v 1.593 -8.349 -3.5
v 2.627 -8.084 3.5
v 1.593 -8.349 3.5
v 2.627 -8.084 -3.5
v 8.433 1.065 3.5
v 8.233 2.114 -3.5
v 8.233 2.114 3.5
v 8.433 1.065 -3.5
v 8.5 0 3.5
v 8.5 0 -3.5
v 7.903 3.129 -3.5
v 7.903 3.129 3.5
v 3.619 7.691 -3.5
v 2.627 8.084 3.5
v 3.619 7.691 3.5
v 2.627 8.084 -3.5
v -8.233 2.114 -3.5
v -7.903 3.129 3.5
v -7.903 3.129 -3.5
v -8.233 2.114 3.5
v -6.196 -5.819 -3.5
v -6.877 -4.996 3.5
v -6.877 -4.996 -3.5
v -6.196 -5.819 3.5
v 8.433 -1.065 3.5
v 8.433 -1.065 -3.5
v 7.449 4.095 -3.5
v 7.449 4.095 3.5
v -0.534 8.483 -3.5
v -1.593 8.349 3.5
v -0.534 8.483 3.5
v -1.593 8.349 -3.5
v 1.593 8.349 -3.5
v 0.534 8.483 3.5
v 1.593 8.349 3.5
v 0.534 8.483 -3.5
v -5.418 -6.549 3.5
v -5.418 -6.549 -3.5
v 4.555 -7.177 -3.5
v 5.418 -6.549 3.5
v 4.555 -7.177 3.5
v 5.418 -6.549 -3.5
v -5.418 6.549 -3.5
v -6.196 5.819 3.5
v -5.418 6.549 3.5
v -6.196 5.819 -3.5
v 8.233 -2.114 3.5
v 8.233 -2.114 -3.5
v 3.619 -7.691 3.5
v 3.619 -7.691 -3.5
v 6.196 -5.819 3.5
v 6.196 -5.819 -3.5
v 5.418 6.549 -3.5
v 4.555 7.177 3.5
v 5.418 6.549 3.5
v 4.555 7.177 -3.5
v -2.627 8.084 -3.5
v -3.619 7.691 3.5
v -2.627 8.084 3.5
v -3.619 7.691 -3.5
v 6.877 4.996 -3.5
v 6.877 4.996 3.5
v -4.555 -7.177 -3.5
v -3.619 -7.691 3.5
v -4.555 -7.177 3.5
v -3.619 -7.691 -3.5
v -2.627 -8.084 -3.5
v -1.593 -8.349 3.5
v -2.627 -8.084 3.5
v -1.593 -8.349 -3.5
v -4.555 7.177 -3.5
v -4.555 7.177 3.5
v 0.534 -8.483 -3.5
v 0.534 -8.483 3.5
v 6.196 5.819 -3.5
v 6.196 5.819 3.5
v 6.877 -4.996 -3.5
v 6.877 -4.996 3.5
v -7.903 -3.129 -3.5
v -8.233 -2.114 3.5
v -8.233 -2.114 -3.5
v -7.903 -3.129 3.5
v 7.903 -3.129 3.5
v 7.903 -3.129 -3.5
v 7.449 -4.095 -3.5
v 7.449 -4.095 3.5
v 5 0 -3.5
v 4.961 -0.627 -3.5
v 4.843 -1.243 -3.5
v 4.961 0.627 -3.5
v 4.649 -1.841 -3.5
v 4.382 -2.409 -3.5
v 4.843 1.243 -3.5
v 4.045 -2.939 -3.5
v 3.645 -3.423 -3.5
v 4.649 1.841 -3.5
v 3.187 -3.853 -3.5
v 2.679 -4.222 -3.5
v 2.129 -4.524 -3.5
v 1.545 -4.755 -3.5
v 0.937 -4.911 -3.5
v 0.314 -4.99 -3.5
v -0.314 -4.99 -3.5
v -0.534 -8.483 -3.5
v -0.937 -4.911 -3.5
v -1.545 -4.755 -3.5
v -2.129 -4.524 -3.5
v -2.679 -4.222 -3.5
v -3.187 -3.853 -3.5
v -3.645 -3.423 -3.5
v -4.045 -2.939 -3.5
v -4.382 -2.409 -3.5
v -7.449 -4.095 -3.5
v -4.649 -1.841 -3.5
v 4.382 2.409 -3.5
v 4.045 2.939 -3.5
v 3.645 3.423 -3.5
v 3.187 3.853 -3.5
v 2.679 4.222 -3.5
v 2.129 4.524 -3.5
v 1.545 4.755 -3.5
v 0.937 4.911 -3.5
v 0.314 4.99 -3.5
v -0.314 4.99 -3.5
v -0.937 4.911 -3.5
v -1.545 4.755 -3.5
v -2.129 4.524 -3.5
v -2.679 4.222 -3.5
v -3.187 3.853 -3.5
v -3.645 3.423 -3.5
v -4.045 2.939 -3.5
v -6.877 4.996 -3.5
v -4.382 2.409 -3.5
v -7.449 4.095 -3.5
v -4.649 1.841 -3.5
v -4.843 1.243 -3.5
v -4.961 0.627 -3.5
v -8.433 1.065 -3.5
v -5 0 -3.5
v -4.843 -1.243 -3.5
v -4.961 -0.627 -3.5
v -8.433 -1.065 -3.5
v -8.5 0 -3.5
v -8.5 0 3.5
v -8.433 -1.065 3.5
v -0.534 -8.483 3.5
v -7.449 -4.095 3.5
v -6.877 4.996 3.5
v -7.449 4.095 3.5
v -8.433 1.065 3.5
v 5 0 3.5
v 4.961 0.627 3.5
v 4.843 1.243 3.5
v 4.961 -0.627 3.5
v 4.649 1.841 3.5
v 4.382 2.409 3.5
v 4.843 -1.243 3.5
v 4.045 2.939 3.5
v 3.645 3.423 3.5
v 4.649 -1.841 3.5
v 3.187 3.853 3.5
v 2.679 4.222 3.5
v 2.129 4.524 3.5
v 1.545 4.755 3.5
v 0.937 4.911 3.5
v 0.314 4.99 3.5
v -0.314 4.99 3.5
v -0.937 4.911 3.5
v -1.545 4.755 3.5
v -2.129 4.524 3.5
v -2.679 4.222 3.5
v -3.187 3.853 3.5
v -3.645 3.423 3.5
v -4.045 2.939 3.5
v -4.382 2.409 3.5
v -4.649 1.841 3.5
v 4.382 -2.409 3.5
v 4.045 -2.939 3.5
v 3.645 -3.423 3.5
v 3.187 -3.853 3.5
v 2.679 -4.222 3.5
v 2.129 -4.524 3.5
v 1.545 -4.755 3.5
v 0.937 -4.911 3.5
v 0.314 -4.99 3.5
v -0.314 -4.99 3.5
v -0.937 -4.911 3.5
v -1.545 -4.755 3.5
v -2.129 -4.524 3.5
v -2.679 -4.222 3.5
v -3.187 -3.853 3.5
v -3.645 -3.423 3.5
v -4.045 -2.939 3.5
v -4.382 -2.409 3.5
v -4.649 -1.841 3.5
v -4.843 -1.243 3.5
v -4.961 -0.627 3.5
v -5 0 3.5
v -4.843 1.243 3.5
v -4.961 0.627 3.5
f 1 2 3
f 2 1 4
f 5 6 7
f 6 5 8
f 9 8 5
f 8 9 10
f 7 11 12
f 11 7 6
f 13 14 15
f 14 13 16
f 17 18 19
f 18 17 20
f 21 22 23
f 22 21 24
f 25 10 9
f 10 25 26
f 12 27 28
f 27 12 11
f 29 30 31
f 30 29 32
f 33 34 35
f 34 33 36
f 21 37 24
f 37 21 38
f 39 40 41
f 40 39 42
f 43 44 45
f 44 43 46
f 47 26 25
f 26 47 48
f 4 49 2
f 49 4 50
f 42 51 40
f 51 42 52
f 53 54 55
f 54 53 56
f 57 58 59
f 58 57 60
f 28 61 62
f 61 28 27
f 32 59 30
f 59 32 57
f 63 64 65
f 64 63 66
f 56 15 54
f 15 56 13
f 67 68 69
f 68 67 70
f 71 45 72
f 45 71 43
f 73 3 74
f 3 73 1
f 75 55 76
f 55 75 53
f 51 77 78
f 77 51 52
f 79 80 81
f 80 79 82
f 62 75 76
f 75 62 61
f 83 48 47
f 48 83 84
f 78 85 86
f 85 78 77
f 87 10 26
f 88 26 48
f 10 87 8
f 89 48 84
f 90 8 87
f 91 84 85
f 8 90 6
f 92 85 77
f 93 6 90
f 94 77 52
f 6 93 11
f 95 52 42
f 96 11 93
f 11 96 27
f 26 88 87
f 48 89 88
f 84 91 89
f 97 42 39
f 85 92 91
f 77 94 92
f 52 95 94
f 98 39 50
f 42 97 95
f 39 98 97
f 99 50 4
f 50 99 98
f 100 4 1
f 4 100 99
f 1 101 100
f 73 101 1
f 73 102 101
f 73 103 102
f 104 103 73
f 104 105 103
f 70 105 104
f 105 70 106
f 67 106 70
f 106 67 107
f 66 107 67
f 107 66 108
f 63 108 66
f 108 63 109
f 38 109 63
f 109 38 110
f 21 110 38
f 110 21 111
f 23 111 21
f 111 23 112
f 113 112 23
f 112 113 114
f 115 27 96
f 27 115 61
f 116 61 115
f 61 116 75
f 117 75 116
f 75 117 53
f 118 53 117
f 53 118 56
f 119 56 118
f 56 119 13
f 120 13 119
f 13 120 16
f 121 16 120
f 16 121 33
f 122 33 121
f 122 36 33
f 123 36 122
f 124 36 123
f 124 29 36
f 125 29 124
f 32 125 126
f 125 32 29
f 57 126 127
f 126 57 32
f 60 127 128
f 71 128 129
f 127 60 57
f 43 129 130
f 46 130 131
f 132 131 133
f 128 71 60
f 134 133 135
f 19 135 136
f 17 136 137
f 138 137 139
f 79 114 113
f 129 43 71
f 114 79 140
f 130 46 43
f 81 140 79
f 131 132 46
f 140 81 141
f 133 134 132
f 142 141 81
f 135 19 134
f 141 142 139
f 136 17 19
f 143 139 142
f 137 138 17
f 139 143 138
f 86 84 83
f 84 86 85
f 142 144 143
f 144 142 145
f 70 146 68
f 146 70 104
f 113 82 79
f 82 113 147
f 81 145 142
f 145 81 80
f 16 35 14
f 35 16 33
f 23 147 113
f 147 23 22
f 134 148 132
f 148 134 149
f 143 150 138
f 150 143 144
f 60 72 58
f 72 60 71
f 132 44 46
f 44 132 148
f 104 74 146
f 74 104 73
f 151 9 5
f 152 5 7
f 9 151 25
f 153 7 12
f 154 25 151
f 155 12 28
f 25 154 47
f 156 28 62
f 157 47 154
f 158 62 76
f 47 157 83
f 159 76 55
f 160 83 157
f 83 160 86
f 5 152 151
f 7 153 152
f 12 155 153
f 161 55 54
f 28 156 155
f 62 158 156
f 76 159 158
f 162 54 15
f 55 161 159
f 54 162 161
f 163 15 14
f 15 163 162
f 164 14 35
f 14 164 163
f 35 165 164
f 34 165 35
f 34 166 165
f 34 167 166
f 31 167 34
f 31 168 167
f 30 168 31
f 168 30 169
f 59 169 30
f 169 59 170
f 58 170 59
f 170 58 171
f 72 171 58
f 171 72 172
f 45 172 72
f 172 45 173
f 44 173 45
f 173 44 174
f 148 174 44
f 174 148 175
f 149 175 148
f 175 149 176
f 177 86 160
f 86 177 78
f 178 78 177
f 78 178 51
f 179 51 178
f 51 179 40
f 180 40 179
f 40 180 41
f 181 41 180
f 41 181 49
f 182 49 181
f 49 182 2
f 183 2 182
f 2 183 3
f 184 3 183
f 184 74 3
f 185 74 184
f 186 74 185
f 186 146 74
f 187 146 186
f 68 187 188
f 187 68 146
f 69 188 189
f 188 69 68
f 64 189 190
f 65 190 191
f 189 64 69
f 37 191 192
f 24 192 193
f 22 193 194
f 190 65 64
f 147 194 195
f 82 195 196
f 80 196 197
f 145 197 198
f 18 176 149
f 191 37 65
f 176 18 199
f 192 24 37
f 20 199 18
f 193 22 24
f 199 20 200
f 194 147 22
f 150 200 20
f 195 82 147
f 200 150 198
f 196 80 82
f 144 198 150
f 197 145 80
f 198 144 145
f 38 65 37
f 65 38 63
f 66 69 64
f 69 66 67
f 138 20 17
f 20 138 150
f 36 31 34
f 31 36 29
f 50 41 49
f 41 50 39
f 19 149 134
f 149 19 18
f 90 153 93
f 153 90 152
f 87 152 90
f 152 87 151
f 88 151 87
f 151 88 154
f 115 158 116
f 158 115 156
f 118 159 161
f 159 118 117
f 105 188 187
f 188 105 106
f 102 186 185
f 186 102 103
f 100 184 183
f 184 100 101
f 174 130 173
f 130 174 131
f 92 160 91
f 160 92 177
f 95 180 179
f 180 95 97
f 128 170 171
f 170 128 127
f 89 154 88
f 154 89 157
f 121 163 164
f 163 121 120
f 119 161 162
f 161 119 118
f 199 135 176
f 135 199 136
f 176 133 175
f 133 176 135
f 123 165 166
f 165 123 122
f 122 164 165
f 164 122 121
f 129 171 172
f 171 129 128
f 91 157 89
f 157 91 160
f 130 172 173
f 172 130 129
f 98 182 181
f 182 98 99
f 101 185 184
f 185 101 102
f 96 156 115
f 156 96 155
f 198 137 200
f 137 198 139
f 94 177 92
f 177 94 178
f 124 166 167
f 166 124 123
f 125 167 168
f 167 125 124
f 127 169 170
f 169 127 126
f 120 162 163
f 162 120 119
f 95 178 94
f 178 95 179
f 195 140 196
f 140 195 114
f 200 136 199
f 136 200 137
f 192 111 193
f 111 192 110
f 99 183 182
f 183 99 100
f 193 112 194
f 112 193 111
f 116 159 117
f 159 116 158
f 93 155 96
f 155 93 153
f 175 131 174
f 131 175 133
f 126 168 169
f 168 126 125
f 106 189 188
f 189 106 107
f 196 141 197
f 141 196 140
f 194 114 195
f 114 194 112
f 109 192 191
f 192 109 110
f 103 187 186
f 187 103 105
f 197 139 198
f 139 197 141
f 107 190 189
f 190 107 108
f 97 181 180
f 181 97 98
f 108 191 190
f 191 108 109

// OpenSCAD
$fn = 50;


difference() {
	union() {
		translate(v = [0, 0, -3.5000000000]) {
			cylinder(h = 7, r = 8.5000000000);
		}
	}
	union() {
		translate(v = [0, 0, -100.0000000000]) {
			cylinder(h = 200, r = 5.0000000000);
		}
	}
}
